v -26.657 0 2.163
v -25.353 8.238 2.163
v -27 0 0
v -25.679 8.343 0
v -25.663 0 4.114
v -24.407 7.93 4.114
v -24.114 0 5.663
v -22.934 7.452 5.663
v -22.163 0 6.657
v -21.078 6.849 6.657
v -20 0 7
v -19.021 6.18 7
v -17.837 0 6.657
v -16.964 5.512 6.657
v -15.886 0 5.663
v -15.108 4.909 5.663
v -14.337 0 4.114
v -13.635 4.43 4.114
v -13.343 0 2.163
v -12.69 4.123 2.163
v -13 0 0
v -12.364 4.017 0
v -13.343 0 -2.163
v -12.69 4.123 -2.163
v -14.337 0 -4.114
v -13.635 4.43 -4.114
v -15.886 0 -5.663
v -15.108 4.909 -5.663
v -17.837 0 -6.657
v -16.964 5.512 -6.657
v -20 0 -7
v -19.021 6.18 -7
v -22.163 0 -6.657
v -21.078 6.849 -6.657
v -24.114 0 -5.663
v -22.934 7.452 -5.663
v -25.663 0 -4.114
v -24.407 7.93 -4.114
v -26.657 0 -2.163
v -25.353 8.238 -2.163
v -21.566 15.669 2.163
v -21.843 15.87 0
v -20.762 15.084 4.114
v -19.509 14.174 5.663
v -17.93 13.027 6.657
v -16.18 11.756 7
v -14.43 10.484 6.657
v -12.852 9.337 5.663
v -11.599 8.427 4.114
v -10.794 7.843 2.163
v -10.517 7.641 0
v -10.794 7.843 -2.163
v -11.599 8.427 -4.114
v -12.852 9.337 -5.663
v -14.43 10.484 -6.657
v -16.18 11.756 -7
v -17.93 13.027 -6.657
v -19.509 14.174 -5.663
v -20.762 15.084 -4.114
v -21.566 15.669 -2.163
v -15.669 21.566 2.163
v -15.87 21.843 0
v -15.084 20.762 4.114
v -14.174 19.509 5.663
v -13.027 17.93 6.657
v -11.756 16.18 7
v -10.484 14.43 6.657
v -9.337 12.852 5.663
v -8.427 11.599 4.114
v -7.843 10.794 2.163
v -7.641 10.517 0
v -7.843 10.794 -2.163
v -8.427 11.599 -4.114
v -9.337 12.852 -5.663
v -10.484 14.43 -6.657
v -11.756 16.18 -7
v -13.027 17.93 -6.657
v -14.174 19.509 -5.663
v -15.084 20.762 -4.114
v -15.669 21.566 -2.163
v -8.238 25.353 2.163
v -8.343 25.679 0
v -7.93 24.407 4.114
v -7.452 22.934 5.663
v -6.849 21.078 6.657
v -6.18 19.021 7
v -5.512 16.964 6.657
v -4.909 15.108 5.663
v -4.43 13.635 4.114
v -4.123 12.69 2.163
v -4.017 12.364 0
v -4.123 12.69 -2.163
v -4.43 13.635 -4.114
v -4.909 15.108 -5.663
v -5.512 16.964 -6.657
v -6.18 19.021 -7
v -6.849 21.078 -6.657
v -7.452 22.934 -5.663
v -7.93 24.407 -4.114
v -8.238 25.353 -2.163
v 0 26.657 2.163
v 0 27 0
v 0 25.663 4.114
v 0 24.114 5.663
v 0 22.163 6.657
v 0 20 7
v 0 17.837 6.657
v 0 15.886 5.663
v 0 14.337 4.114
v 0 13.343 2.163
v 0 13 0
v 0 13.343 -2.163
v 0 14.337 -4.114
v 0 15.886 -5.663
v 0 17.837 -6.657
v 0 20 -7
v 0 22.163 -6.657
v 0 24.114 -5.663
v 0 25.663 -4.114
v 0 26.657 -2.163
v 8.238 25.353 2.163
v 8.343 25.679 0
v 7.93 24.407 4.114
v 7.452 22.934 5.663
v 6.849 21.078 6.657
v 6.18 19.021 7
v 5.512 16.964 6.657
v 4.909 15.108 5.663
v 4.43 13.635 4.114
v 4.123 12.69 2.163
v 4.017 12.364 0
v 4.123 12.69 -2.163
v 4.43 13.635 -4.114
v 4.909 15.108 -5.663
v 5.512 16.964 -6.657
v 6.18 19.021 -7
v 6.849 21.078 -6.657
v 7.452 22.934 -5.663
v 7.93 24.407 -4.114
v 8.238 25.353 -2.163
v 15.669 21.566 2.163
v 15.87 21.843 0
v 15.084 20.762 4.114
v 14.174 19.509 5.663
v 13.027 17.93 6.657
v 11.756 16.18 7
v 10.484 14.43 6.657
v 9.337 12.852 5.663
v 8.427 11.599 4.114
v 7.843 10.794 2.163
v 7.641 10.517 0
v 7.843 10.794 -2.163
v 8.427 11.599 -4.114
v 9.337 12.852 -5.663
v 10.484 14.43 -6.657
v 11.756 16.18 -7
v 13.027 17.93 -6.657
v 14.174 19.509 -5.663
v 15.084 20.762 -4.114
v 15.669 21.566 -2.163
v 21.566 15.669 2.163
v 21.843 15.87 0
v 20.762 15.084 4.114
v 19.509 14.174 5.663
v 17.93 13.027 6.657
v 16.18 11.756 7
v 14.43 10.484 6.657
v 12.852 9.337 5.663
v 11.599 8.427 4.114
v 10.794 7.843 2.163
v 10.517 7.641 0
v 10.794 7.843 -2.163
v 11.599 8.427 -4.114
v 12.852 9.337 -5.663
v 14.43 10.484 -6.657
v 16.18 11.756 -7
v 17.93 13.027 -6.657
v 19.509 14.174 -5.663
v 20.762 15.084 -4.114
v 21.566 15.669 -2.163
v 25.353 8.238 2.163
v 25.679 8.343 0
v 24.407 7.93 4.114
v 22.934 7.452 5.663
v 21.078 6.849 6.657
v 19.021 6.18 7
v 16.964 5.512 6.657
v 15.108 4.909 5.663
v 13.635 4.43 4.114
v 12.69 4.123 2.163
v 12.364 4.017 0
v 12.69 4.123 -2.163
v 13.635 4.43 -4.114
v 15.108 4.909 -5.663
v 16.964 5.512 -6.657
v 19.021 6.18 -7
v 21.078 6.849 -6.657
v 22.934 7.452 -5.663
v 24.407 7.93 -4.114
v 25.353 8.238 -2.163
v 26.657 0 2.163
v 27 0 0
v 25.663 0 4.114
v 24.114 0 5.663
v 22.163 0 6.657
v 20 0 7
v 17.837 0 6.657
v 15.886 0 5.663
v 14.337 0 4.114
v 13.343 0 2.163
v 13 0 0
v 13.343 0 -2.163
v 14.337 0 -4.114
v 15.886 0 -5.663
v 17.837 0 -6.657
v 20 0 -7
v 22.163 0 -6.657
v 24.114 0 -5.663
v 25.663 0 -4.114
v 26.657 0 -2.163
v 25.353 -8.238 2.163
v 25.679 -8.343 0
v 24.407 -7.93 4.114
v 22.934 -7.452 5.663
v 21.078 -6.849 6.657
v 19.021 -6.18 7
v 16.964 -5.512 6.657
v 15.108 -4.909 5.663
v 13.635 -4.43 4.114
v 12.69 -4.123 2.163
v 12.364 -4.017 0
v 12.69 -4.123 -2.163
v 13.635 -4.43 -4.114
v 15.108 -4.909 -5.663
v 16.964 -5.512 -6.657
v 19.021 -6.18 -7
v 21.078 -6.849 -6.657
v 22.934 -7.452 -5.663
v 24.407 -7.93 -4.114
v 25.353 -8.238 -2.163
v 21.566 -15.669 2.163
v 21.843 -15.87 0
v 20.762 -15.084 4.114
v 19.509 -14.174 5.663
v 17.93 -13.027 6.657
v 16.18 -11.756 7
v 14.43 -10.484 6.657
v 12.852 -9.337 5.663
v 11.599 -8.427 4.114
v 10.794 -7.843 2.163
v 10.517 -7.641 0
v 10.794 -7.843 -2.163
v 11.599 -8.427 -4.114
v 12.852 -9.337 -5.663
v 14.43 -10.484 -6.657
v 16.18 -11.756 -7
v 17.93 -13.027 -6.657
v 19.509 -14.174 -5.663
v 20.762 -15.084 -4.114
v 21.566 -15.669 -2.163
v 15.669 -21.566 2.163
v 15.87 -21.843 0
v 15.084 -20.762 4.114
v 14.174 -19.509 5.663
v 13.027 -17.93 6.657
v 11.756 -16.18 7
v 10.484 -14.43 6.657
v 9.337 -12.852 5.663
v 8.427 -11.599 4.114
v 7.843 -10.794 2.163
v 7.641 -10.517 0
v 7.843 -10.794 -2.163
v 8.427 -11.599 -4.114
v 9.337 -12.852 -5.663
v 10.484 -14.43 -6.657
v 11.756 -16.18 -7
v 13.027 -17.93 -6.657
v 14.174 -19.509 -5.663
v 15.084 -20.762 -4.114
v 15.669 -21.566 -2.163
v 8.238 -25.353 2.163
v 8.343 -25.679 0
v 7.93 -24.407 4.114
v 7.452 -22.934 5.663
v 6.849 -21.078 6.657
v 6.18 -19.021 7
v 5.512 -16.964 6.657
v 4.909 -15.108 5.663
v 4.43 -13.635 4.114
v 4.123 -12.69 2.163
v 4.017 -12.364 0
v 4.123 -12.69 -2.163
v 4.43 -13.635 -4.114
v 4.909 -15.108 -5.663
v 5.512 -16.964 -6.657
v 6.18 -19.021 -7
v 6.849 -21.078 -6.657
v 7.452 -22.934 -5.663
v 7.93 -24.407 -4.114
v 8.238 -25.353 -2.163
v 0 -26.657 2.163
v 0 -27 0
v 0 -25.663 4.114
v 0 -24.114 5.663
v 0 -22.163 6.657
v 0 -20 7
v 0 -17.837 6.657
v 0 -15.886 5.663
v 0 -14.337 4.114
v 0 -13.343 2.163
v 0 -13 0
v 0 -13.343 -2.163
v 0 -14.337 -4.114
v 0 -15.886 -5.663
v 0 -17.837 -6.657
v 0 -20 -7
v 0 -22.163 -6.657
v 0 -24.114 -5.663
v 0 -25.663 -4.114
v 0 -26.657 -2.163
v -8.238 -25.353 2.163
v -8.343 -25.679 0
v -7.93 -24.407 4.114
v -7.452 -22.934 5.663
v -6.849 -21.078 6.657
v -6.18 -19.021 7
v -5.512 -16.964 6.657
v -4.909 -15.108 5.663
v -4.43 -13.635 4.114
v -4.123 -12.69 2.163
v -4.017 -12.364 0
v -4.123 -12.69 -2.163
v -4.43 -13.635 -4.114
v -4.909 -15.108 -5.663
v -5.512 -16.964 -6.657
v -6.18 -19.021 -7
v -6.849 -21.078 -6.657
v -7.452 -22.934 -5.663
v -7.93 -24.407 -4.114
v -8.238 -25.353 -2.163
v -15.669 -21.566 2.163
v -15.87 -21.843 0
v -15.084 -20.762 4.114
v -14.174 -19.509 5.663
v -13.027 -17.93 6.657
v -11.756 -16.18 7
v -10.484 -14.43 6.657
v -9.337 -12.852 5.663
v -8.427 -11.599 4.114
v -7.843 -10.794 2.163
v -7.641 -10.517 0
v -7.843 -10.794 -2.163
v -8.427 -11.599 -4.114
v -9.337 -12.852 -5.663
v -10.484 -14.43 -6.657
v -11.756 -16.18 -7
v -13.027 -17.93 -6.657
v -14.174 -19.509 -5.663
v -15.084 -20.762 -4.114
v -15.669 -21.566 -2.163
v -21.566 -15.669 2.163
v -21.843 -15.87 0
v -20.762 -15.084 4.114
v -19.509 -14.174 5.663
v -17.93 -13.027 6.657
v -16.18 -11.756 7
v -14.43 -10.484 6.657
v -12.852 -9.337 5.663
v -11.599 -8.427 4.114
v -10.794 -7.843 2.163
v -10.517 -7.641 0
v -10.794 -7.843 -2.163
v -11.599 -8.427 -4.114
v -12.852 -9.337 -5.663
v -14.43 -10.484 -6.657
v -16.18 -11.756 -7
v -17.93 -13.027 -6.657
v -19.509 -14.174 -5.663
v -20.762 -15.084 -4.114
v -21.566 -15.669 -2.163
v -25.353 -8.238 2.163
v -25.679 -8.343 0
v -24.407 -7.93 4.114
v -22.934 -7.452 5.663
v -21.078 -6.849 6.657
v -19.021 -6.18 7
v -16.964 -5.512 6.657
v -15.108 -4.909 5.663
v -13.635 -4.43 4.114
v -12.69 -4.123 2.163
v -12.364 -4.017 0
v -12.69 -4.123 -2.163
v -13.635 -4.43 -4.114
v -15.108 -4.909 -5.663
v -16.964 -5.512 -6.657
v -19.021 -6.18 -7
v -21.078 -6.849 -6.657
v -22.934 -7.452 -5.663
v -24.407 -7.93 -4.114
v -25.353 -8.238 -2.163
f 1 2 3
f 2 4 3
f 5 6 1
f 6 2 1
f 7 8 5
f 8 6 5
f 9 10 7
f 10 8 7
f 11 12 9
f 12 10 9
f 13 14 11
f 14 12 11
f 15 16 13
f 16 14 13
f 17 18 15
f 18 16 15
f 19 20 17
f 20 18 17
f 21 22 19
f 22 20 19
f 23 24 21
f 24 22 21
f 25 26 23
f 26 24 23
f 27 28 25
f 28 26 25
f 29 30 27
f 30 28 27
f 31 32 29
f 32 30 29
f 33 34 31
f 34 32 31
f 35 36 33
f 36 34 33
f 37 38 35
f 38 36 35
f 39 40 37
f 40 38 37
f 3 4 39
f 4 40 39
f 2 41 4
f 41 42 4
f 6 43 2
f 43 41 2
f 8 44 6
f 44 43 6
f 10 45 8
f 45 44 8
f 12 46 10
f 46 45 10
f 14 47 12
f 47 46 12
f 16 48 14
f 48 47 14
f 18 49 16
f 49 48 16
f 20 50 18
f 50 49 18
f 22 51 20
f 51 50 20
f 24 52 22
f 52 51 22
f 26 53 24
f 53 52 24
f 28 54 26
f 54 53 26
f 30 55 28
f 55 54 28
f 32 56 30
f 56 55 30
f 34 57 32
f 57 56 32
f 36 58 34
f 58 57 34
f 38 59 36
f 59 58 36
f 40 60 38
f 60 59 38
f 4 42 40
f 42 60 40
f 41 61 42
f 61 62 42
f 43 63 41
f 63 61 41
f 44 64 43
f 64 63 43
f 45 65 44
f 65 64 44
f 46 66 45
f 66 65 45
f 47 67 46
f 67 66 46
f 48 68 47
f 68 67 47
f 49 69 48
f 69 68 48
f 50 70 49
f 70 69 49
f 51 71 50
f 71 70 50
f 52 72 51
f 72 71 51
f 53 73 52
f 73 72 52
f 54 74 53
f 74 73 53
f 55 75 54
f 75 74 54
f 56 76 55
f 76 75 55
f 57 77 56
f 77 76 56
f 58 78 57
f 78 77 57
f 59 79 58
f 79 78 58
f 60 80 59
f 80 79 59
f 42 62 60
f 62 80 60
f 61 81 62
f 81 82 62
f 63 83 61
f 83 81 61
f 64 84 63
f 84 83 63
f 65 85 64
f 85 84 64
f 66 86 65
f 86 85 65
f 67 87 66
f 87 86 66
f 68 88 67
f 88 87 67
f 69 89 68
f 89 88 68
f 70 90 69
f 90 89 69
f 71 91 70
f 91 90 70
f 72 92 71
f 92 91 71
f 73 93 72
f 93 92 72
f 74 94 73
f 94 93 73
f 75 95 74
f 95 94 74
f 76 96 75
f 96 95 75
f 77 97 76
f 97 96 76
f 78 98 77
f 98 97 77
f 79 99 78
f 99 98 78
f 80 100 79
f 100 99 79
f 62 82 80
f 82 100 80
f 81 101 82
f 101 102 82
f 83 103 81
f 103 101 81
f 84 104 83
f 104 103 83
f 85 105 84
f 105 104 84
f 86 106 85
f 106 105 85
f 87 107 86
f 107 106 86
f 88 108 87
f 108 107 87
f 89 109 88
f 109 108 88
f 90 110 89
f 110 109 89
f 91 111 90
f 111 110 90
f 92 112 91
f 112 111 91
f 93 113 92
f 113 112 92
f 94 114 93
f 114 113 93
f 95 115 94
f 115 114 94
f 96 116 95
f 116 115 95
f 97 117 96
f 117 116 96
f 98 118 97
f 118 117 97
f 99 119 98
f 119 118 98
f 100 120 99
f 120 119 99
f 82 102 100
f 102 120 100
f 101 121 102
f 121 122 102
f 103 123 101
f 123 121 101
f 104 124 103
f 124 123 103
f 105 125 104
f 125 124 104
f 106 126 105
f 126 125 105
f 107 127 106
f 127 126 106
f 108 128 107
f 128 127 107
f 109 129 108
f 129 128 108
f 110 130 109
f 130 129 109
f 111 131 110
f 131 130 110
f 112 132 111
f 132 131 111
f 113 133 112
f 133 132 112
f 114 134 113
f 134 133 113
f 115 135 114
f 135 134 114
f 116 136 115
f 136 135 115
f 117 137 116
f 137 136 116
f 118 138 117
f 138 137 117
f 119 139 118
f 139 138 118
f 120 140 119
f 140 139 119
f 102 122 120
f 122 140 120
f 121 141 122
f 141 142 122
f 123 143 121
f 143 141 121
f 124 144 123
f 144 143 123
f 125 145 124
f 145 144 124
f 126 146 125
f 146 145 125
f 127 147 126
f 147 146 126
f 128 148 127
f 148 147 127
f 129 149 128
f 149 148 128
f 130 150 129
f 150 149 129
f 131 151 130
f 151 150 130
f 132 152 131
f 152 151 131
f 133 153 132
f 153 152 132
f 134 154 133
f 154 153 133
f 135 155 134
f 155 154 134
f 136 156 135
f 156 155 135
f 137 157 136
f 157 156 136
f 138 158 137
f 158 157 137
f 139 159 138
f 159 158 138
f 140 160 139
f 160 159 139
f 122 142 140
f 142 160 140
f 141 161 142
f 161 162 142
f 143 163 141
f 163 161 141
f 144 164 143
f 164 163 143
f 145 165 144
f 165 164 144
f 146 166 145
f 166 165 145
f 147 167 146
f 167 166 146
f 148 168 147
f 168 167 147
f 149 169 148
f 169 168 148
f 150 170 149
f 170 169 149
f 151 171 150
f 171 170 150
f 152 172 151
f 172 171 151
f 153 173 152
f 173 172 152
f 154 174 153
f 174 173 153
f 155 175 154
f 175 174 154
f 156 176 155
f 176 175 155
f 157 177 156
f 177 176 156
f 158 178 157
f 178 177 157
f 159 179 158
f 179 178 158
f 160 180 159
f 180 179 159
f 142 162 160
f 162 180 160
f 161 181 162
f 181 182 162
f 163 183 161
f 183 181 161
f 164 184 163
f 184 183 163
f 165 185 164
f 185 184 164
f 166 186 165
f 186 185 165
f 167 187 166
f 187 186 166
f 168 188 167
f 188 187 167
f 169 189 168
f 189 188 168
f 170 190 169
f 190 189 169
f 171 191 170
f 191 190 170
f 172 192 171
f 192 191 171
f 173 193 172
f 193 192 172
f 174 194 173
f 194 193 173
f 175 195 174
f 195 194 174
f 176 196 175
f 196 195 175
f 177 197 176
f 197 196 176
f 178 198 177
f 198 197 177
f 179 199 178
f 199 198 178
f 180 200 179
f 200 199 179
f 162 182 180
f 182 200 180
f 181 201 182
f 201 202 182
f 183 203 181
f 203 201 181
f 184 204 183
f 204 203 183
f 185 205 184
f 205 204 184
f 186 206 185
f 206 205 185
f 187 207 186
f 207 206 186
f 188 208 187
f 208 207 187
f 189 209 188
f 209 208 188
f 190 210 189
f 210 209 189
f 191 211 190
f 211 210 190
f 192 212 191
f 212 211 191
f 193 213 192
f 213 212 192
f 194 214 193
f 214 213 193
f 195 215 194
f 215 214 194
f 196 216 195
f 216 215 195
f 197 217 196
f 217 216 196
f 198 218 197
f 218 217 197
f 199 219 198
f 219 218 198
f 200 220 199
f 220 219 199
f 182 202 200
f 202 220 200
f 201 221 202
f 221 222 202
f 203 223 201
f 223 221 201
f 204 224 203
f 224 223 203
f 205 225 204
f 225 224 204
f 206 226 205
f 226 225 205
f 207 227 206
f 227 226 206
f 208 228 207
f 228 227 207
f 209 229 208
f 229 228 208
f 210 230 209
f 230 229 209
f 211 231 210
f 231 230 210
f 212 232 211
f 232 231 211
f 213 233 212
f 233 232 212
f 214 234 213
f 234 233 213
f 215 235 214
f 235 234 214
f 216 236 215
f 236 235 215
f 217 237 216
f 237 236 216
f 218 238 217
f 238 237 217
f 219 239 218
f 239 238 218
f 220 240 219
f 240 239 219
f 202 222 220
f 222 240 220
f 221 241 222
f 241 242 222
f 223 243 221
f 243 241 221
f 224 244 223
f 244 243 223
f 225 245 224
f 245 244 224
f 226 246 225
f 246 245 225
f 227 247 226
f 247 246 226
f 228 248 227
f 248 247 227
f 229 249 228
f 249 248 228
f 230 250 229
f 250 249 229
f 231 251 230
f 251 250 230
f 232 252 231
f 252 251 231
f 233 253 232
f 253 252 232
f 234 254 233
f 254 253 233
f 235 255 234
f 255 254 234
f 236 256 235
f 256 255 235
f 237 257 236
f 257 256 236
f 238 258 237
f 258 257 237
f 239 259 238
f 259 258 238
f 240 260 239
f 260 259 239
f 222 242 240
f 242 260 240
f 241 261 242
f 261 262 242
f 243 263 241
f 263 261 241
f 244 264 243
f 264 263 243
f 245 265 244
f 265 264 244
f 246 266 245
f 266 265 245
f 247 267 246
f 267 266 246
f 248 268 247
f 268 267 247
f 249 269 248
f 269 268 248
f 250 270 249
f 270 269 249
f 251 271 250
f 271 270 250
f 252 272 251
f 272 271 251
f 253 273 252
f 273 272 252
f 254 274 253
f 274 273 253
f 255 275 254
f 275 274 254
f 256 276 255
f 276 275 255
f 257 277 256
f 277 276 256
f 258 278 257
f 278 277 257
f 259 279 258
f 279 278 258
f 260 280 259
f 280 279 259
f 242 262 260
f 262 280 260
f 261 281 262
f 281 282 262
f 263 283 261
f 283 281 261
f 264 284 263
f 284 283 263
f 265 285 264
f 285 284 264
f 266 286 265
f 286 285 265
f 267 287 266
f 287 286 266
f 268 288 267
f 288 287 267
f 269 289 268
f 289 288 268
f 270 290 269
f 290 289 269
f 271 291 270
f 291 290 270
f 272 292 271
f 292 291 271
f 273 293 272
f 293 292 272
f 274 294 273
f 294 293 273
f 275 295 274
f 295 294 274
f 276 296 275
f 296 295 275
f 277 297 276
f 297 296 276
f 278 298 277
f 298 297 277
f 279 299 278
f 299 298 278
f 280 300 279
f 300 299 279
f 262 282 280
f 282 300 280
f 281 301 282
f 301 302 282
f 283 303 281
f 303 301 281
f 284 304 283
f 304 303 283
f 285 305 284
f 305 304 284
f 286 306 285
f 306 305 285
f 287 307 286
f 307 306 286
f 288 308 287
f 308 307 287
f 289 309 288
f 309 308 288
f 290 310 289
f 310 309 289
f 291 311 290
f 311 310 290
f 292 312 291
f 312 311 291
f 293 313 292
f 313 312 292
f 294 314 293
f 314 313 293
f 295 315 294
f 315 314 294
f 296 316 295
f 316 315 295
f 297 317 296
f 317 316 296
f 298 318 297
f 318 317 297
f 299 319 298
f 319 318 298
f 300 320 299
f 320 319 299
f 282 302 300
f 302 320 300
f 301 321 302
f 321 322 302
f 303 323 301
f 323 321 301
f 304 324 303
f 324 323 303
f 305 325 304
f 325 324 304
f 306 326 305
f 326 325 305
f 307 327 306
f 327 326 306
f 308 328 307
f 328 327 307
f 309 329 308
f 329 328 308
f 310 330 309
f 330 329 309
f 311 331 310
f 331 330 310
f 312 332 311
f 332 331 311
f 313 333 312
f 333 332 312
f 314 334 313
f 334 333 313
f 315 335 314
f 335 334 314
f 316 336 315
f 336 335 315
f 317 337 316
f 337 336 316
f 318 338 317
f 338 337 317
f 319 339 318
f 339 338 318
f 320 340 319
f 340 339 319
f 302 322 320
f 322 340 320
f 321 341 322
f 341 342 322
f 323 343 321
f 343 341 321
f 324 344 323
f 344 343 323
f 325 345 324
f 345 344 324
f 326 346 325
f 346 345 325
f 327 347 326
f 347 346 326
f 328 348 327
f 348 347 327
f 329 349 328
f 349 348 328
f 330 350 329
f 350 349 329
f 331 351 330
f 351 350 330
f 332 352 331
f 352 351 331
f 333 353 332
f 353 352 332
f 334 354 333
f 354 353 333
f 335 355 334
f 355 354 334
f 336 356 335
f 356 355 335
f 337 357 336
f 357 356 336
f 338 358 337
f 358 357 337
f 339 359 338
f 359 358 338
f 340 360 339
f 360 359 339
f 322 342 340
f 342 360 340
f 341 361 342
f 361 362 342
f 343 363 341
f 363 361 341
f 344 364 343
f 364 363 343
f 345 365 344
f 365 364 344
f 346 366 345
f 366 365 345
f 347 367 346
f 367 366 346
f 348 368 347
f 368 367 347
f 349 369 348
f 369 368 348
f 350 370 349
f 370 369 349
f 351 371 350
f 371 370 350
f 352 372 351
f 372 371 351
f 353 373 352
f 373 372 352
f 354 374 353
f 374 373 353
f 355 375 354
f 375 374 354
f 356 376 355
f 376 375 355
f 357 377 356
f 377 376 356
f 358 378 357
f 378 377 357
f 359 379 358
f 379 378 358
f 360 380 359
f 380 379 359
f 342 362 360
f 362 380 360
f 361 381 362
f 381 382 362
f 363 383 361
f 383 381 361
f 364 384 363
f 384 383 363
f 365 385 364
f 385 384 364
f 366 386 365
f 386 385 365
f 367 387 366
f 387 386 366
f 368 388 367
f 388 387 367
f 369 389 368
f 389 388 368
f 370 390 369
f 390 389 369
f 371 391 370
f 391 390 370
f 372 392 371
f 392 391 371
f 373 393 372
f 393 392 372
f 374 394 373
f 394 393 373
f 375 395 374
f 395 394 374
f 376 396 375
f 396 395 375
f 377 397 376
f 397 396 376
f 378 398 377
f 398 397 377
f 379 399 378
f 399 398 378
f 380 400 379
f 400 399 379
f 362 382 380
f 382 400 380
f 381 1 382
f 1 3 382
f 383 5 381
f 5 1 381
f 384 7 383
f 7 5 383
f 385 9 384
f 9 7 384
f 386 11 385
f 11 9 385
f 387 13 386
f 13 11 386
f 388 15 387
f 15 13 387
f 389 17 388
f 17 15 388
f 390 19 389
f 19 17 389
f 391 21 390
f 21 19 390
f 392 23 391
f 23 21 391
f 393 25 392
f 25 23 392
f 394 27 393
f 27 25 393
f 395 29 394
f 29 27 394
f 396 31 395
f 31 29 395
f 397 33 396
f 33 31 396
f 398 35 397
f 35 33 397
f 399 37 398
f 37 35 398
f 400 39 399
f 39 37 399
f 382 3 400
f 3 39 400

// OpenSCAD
// BSD-3-Clause License
//
// Copyright 2025 Kit Fitzpatrick
//
// Redistribution and use in source and binary forms, with or without modification, are
// permitted provided that the following conditions are met:
//
// 1. Redistributions of source code must retain the above copyright notice, this list of
//    conditions and the following disclaimer.
//
// 2. Redistributions in binary form must reproduce the above copyright notice, this list
//    of conditions and the following disclaimer in the documentation and/or other
//    materials provided with the distribution.
//
// 3. Neither the name of the copyright holder nor the names of its contributors may be
//    used to endorse or promote products derived from this software without specific
//    prior written permission.
//
// THIS SOFTWARE IS PROVIDED BY THE COPYRIGHT HOLDERS AND CONTRIBUTORS “AS IS” AND ANY
// EXPRESS OR IMPLIED WARRANTIES, INCLUDING, BUT NOT LIMITED TO, THE IMPLIED WARRANTIES
// OF MERCHANTABILITY AND FITNESS FOR A PARTICULAR PURPOSE ARE DISCLAIMED. IN NO EVENT
// SHALL THE COPYRIGHT HOLDER OR CONTRIBUTORS BE LIABLE FOR ANY DIRECT, INDIRECT,
// INCIDENTAL, SPECIAL, EXEMPLARY, OR CONSEQUENTIAL DAMAGES (INCLUDING, BUT NOT LIMITED
// TO, PROCUREMENT OF SUBSTITUTE GOODS OR SERVICES; LOSS OF USE, DATA, OR PROFITS; OR
// BUSINESS INTERRUPTION) HOWEVER CAUSED AND ON ANY THEORY OF LIABILITY, WHETHER IN
// CONTRACT, STRICT LIABILITY, OR TORT (INCLUDING NEGLIGENCE OR OTHERWISE) ARISING IN ANY
// WAY OUT OF THE USE OF THIS SOFTWARE, EVEN IF ADVISED OF THE POSSIBILITY OF SUCH DAMAGE.

//
// This module creates a torus shape.
//
// -- Part of the antique candlestick holder project
//


module torus(d=10, thickness=4,res=20){
    rotate_extrude($fn=res) {
        translate([d, 0]) circle(thickness, $fn=res);
}}

torus(thickness=7, d=20);
